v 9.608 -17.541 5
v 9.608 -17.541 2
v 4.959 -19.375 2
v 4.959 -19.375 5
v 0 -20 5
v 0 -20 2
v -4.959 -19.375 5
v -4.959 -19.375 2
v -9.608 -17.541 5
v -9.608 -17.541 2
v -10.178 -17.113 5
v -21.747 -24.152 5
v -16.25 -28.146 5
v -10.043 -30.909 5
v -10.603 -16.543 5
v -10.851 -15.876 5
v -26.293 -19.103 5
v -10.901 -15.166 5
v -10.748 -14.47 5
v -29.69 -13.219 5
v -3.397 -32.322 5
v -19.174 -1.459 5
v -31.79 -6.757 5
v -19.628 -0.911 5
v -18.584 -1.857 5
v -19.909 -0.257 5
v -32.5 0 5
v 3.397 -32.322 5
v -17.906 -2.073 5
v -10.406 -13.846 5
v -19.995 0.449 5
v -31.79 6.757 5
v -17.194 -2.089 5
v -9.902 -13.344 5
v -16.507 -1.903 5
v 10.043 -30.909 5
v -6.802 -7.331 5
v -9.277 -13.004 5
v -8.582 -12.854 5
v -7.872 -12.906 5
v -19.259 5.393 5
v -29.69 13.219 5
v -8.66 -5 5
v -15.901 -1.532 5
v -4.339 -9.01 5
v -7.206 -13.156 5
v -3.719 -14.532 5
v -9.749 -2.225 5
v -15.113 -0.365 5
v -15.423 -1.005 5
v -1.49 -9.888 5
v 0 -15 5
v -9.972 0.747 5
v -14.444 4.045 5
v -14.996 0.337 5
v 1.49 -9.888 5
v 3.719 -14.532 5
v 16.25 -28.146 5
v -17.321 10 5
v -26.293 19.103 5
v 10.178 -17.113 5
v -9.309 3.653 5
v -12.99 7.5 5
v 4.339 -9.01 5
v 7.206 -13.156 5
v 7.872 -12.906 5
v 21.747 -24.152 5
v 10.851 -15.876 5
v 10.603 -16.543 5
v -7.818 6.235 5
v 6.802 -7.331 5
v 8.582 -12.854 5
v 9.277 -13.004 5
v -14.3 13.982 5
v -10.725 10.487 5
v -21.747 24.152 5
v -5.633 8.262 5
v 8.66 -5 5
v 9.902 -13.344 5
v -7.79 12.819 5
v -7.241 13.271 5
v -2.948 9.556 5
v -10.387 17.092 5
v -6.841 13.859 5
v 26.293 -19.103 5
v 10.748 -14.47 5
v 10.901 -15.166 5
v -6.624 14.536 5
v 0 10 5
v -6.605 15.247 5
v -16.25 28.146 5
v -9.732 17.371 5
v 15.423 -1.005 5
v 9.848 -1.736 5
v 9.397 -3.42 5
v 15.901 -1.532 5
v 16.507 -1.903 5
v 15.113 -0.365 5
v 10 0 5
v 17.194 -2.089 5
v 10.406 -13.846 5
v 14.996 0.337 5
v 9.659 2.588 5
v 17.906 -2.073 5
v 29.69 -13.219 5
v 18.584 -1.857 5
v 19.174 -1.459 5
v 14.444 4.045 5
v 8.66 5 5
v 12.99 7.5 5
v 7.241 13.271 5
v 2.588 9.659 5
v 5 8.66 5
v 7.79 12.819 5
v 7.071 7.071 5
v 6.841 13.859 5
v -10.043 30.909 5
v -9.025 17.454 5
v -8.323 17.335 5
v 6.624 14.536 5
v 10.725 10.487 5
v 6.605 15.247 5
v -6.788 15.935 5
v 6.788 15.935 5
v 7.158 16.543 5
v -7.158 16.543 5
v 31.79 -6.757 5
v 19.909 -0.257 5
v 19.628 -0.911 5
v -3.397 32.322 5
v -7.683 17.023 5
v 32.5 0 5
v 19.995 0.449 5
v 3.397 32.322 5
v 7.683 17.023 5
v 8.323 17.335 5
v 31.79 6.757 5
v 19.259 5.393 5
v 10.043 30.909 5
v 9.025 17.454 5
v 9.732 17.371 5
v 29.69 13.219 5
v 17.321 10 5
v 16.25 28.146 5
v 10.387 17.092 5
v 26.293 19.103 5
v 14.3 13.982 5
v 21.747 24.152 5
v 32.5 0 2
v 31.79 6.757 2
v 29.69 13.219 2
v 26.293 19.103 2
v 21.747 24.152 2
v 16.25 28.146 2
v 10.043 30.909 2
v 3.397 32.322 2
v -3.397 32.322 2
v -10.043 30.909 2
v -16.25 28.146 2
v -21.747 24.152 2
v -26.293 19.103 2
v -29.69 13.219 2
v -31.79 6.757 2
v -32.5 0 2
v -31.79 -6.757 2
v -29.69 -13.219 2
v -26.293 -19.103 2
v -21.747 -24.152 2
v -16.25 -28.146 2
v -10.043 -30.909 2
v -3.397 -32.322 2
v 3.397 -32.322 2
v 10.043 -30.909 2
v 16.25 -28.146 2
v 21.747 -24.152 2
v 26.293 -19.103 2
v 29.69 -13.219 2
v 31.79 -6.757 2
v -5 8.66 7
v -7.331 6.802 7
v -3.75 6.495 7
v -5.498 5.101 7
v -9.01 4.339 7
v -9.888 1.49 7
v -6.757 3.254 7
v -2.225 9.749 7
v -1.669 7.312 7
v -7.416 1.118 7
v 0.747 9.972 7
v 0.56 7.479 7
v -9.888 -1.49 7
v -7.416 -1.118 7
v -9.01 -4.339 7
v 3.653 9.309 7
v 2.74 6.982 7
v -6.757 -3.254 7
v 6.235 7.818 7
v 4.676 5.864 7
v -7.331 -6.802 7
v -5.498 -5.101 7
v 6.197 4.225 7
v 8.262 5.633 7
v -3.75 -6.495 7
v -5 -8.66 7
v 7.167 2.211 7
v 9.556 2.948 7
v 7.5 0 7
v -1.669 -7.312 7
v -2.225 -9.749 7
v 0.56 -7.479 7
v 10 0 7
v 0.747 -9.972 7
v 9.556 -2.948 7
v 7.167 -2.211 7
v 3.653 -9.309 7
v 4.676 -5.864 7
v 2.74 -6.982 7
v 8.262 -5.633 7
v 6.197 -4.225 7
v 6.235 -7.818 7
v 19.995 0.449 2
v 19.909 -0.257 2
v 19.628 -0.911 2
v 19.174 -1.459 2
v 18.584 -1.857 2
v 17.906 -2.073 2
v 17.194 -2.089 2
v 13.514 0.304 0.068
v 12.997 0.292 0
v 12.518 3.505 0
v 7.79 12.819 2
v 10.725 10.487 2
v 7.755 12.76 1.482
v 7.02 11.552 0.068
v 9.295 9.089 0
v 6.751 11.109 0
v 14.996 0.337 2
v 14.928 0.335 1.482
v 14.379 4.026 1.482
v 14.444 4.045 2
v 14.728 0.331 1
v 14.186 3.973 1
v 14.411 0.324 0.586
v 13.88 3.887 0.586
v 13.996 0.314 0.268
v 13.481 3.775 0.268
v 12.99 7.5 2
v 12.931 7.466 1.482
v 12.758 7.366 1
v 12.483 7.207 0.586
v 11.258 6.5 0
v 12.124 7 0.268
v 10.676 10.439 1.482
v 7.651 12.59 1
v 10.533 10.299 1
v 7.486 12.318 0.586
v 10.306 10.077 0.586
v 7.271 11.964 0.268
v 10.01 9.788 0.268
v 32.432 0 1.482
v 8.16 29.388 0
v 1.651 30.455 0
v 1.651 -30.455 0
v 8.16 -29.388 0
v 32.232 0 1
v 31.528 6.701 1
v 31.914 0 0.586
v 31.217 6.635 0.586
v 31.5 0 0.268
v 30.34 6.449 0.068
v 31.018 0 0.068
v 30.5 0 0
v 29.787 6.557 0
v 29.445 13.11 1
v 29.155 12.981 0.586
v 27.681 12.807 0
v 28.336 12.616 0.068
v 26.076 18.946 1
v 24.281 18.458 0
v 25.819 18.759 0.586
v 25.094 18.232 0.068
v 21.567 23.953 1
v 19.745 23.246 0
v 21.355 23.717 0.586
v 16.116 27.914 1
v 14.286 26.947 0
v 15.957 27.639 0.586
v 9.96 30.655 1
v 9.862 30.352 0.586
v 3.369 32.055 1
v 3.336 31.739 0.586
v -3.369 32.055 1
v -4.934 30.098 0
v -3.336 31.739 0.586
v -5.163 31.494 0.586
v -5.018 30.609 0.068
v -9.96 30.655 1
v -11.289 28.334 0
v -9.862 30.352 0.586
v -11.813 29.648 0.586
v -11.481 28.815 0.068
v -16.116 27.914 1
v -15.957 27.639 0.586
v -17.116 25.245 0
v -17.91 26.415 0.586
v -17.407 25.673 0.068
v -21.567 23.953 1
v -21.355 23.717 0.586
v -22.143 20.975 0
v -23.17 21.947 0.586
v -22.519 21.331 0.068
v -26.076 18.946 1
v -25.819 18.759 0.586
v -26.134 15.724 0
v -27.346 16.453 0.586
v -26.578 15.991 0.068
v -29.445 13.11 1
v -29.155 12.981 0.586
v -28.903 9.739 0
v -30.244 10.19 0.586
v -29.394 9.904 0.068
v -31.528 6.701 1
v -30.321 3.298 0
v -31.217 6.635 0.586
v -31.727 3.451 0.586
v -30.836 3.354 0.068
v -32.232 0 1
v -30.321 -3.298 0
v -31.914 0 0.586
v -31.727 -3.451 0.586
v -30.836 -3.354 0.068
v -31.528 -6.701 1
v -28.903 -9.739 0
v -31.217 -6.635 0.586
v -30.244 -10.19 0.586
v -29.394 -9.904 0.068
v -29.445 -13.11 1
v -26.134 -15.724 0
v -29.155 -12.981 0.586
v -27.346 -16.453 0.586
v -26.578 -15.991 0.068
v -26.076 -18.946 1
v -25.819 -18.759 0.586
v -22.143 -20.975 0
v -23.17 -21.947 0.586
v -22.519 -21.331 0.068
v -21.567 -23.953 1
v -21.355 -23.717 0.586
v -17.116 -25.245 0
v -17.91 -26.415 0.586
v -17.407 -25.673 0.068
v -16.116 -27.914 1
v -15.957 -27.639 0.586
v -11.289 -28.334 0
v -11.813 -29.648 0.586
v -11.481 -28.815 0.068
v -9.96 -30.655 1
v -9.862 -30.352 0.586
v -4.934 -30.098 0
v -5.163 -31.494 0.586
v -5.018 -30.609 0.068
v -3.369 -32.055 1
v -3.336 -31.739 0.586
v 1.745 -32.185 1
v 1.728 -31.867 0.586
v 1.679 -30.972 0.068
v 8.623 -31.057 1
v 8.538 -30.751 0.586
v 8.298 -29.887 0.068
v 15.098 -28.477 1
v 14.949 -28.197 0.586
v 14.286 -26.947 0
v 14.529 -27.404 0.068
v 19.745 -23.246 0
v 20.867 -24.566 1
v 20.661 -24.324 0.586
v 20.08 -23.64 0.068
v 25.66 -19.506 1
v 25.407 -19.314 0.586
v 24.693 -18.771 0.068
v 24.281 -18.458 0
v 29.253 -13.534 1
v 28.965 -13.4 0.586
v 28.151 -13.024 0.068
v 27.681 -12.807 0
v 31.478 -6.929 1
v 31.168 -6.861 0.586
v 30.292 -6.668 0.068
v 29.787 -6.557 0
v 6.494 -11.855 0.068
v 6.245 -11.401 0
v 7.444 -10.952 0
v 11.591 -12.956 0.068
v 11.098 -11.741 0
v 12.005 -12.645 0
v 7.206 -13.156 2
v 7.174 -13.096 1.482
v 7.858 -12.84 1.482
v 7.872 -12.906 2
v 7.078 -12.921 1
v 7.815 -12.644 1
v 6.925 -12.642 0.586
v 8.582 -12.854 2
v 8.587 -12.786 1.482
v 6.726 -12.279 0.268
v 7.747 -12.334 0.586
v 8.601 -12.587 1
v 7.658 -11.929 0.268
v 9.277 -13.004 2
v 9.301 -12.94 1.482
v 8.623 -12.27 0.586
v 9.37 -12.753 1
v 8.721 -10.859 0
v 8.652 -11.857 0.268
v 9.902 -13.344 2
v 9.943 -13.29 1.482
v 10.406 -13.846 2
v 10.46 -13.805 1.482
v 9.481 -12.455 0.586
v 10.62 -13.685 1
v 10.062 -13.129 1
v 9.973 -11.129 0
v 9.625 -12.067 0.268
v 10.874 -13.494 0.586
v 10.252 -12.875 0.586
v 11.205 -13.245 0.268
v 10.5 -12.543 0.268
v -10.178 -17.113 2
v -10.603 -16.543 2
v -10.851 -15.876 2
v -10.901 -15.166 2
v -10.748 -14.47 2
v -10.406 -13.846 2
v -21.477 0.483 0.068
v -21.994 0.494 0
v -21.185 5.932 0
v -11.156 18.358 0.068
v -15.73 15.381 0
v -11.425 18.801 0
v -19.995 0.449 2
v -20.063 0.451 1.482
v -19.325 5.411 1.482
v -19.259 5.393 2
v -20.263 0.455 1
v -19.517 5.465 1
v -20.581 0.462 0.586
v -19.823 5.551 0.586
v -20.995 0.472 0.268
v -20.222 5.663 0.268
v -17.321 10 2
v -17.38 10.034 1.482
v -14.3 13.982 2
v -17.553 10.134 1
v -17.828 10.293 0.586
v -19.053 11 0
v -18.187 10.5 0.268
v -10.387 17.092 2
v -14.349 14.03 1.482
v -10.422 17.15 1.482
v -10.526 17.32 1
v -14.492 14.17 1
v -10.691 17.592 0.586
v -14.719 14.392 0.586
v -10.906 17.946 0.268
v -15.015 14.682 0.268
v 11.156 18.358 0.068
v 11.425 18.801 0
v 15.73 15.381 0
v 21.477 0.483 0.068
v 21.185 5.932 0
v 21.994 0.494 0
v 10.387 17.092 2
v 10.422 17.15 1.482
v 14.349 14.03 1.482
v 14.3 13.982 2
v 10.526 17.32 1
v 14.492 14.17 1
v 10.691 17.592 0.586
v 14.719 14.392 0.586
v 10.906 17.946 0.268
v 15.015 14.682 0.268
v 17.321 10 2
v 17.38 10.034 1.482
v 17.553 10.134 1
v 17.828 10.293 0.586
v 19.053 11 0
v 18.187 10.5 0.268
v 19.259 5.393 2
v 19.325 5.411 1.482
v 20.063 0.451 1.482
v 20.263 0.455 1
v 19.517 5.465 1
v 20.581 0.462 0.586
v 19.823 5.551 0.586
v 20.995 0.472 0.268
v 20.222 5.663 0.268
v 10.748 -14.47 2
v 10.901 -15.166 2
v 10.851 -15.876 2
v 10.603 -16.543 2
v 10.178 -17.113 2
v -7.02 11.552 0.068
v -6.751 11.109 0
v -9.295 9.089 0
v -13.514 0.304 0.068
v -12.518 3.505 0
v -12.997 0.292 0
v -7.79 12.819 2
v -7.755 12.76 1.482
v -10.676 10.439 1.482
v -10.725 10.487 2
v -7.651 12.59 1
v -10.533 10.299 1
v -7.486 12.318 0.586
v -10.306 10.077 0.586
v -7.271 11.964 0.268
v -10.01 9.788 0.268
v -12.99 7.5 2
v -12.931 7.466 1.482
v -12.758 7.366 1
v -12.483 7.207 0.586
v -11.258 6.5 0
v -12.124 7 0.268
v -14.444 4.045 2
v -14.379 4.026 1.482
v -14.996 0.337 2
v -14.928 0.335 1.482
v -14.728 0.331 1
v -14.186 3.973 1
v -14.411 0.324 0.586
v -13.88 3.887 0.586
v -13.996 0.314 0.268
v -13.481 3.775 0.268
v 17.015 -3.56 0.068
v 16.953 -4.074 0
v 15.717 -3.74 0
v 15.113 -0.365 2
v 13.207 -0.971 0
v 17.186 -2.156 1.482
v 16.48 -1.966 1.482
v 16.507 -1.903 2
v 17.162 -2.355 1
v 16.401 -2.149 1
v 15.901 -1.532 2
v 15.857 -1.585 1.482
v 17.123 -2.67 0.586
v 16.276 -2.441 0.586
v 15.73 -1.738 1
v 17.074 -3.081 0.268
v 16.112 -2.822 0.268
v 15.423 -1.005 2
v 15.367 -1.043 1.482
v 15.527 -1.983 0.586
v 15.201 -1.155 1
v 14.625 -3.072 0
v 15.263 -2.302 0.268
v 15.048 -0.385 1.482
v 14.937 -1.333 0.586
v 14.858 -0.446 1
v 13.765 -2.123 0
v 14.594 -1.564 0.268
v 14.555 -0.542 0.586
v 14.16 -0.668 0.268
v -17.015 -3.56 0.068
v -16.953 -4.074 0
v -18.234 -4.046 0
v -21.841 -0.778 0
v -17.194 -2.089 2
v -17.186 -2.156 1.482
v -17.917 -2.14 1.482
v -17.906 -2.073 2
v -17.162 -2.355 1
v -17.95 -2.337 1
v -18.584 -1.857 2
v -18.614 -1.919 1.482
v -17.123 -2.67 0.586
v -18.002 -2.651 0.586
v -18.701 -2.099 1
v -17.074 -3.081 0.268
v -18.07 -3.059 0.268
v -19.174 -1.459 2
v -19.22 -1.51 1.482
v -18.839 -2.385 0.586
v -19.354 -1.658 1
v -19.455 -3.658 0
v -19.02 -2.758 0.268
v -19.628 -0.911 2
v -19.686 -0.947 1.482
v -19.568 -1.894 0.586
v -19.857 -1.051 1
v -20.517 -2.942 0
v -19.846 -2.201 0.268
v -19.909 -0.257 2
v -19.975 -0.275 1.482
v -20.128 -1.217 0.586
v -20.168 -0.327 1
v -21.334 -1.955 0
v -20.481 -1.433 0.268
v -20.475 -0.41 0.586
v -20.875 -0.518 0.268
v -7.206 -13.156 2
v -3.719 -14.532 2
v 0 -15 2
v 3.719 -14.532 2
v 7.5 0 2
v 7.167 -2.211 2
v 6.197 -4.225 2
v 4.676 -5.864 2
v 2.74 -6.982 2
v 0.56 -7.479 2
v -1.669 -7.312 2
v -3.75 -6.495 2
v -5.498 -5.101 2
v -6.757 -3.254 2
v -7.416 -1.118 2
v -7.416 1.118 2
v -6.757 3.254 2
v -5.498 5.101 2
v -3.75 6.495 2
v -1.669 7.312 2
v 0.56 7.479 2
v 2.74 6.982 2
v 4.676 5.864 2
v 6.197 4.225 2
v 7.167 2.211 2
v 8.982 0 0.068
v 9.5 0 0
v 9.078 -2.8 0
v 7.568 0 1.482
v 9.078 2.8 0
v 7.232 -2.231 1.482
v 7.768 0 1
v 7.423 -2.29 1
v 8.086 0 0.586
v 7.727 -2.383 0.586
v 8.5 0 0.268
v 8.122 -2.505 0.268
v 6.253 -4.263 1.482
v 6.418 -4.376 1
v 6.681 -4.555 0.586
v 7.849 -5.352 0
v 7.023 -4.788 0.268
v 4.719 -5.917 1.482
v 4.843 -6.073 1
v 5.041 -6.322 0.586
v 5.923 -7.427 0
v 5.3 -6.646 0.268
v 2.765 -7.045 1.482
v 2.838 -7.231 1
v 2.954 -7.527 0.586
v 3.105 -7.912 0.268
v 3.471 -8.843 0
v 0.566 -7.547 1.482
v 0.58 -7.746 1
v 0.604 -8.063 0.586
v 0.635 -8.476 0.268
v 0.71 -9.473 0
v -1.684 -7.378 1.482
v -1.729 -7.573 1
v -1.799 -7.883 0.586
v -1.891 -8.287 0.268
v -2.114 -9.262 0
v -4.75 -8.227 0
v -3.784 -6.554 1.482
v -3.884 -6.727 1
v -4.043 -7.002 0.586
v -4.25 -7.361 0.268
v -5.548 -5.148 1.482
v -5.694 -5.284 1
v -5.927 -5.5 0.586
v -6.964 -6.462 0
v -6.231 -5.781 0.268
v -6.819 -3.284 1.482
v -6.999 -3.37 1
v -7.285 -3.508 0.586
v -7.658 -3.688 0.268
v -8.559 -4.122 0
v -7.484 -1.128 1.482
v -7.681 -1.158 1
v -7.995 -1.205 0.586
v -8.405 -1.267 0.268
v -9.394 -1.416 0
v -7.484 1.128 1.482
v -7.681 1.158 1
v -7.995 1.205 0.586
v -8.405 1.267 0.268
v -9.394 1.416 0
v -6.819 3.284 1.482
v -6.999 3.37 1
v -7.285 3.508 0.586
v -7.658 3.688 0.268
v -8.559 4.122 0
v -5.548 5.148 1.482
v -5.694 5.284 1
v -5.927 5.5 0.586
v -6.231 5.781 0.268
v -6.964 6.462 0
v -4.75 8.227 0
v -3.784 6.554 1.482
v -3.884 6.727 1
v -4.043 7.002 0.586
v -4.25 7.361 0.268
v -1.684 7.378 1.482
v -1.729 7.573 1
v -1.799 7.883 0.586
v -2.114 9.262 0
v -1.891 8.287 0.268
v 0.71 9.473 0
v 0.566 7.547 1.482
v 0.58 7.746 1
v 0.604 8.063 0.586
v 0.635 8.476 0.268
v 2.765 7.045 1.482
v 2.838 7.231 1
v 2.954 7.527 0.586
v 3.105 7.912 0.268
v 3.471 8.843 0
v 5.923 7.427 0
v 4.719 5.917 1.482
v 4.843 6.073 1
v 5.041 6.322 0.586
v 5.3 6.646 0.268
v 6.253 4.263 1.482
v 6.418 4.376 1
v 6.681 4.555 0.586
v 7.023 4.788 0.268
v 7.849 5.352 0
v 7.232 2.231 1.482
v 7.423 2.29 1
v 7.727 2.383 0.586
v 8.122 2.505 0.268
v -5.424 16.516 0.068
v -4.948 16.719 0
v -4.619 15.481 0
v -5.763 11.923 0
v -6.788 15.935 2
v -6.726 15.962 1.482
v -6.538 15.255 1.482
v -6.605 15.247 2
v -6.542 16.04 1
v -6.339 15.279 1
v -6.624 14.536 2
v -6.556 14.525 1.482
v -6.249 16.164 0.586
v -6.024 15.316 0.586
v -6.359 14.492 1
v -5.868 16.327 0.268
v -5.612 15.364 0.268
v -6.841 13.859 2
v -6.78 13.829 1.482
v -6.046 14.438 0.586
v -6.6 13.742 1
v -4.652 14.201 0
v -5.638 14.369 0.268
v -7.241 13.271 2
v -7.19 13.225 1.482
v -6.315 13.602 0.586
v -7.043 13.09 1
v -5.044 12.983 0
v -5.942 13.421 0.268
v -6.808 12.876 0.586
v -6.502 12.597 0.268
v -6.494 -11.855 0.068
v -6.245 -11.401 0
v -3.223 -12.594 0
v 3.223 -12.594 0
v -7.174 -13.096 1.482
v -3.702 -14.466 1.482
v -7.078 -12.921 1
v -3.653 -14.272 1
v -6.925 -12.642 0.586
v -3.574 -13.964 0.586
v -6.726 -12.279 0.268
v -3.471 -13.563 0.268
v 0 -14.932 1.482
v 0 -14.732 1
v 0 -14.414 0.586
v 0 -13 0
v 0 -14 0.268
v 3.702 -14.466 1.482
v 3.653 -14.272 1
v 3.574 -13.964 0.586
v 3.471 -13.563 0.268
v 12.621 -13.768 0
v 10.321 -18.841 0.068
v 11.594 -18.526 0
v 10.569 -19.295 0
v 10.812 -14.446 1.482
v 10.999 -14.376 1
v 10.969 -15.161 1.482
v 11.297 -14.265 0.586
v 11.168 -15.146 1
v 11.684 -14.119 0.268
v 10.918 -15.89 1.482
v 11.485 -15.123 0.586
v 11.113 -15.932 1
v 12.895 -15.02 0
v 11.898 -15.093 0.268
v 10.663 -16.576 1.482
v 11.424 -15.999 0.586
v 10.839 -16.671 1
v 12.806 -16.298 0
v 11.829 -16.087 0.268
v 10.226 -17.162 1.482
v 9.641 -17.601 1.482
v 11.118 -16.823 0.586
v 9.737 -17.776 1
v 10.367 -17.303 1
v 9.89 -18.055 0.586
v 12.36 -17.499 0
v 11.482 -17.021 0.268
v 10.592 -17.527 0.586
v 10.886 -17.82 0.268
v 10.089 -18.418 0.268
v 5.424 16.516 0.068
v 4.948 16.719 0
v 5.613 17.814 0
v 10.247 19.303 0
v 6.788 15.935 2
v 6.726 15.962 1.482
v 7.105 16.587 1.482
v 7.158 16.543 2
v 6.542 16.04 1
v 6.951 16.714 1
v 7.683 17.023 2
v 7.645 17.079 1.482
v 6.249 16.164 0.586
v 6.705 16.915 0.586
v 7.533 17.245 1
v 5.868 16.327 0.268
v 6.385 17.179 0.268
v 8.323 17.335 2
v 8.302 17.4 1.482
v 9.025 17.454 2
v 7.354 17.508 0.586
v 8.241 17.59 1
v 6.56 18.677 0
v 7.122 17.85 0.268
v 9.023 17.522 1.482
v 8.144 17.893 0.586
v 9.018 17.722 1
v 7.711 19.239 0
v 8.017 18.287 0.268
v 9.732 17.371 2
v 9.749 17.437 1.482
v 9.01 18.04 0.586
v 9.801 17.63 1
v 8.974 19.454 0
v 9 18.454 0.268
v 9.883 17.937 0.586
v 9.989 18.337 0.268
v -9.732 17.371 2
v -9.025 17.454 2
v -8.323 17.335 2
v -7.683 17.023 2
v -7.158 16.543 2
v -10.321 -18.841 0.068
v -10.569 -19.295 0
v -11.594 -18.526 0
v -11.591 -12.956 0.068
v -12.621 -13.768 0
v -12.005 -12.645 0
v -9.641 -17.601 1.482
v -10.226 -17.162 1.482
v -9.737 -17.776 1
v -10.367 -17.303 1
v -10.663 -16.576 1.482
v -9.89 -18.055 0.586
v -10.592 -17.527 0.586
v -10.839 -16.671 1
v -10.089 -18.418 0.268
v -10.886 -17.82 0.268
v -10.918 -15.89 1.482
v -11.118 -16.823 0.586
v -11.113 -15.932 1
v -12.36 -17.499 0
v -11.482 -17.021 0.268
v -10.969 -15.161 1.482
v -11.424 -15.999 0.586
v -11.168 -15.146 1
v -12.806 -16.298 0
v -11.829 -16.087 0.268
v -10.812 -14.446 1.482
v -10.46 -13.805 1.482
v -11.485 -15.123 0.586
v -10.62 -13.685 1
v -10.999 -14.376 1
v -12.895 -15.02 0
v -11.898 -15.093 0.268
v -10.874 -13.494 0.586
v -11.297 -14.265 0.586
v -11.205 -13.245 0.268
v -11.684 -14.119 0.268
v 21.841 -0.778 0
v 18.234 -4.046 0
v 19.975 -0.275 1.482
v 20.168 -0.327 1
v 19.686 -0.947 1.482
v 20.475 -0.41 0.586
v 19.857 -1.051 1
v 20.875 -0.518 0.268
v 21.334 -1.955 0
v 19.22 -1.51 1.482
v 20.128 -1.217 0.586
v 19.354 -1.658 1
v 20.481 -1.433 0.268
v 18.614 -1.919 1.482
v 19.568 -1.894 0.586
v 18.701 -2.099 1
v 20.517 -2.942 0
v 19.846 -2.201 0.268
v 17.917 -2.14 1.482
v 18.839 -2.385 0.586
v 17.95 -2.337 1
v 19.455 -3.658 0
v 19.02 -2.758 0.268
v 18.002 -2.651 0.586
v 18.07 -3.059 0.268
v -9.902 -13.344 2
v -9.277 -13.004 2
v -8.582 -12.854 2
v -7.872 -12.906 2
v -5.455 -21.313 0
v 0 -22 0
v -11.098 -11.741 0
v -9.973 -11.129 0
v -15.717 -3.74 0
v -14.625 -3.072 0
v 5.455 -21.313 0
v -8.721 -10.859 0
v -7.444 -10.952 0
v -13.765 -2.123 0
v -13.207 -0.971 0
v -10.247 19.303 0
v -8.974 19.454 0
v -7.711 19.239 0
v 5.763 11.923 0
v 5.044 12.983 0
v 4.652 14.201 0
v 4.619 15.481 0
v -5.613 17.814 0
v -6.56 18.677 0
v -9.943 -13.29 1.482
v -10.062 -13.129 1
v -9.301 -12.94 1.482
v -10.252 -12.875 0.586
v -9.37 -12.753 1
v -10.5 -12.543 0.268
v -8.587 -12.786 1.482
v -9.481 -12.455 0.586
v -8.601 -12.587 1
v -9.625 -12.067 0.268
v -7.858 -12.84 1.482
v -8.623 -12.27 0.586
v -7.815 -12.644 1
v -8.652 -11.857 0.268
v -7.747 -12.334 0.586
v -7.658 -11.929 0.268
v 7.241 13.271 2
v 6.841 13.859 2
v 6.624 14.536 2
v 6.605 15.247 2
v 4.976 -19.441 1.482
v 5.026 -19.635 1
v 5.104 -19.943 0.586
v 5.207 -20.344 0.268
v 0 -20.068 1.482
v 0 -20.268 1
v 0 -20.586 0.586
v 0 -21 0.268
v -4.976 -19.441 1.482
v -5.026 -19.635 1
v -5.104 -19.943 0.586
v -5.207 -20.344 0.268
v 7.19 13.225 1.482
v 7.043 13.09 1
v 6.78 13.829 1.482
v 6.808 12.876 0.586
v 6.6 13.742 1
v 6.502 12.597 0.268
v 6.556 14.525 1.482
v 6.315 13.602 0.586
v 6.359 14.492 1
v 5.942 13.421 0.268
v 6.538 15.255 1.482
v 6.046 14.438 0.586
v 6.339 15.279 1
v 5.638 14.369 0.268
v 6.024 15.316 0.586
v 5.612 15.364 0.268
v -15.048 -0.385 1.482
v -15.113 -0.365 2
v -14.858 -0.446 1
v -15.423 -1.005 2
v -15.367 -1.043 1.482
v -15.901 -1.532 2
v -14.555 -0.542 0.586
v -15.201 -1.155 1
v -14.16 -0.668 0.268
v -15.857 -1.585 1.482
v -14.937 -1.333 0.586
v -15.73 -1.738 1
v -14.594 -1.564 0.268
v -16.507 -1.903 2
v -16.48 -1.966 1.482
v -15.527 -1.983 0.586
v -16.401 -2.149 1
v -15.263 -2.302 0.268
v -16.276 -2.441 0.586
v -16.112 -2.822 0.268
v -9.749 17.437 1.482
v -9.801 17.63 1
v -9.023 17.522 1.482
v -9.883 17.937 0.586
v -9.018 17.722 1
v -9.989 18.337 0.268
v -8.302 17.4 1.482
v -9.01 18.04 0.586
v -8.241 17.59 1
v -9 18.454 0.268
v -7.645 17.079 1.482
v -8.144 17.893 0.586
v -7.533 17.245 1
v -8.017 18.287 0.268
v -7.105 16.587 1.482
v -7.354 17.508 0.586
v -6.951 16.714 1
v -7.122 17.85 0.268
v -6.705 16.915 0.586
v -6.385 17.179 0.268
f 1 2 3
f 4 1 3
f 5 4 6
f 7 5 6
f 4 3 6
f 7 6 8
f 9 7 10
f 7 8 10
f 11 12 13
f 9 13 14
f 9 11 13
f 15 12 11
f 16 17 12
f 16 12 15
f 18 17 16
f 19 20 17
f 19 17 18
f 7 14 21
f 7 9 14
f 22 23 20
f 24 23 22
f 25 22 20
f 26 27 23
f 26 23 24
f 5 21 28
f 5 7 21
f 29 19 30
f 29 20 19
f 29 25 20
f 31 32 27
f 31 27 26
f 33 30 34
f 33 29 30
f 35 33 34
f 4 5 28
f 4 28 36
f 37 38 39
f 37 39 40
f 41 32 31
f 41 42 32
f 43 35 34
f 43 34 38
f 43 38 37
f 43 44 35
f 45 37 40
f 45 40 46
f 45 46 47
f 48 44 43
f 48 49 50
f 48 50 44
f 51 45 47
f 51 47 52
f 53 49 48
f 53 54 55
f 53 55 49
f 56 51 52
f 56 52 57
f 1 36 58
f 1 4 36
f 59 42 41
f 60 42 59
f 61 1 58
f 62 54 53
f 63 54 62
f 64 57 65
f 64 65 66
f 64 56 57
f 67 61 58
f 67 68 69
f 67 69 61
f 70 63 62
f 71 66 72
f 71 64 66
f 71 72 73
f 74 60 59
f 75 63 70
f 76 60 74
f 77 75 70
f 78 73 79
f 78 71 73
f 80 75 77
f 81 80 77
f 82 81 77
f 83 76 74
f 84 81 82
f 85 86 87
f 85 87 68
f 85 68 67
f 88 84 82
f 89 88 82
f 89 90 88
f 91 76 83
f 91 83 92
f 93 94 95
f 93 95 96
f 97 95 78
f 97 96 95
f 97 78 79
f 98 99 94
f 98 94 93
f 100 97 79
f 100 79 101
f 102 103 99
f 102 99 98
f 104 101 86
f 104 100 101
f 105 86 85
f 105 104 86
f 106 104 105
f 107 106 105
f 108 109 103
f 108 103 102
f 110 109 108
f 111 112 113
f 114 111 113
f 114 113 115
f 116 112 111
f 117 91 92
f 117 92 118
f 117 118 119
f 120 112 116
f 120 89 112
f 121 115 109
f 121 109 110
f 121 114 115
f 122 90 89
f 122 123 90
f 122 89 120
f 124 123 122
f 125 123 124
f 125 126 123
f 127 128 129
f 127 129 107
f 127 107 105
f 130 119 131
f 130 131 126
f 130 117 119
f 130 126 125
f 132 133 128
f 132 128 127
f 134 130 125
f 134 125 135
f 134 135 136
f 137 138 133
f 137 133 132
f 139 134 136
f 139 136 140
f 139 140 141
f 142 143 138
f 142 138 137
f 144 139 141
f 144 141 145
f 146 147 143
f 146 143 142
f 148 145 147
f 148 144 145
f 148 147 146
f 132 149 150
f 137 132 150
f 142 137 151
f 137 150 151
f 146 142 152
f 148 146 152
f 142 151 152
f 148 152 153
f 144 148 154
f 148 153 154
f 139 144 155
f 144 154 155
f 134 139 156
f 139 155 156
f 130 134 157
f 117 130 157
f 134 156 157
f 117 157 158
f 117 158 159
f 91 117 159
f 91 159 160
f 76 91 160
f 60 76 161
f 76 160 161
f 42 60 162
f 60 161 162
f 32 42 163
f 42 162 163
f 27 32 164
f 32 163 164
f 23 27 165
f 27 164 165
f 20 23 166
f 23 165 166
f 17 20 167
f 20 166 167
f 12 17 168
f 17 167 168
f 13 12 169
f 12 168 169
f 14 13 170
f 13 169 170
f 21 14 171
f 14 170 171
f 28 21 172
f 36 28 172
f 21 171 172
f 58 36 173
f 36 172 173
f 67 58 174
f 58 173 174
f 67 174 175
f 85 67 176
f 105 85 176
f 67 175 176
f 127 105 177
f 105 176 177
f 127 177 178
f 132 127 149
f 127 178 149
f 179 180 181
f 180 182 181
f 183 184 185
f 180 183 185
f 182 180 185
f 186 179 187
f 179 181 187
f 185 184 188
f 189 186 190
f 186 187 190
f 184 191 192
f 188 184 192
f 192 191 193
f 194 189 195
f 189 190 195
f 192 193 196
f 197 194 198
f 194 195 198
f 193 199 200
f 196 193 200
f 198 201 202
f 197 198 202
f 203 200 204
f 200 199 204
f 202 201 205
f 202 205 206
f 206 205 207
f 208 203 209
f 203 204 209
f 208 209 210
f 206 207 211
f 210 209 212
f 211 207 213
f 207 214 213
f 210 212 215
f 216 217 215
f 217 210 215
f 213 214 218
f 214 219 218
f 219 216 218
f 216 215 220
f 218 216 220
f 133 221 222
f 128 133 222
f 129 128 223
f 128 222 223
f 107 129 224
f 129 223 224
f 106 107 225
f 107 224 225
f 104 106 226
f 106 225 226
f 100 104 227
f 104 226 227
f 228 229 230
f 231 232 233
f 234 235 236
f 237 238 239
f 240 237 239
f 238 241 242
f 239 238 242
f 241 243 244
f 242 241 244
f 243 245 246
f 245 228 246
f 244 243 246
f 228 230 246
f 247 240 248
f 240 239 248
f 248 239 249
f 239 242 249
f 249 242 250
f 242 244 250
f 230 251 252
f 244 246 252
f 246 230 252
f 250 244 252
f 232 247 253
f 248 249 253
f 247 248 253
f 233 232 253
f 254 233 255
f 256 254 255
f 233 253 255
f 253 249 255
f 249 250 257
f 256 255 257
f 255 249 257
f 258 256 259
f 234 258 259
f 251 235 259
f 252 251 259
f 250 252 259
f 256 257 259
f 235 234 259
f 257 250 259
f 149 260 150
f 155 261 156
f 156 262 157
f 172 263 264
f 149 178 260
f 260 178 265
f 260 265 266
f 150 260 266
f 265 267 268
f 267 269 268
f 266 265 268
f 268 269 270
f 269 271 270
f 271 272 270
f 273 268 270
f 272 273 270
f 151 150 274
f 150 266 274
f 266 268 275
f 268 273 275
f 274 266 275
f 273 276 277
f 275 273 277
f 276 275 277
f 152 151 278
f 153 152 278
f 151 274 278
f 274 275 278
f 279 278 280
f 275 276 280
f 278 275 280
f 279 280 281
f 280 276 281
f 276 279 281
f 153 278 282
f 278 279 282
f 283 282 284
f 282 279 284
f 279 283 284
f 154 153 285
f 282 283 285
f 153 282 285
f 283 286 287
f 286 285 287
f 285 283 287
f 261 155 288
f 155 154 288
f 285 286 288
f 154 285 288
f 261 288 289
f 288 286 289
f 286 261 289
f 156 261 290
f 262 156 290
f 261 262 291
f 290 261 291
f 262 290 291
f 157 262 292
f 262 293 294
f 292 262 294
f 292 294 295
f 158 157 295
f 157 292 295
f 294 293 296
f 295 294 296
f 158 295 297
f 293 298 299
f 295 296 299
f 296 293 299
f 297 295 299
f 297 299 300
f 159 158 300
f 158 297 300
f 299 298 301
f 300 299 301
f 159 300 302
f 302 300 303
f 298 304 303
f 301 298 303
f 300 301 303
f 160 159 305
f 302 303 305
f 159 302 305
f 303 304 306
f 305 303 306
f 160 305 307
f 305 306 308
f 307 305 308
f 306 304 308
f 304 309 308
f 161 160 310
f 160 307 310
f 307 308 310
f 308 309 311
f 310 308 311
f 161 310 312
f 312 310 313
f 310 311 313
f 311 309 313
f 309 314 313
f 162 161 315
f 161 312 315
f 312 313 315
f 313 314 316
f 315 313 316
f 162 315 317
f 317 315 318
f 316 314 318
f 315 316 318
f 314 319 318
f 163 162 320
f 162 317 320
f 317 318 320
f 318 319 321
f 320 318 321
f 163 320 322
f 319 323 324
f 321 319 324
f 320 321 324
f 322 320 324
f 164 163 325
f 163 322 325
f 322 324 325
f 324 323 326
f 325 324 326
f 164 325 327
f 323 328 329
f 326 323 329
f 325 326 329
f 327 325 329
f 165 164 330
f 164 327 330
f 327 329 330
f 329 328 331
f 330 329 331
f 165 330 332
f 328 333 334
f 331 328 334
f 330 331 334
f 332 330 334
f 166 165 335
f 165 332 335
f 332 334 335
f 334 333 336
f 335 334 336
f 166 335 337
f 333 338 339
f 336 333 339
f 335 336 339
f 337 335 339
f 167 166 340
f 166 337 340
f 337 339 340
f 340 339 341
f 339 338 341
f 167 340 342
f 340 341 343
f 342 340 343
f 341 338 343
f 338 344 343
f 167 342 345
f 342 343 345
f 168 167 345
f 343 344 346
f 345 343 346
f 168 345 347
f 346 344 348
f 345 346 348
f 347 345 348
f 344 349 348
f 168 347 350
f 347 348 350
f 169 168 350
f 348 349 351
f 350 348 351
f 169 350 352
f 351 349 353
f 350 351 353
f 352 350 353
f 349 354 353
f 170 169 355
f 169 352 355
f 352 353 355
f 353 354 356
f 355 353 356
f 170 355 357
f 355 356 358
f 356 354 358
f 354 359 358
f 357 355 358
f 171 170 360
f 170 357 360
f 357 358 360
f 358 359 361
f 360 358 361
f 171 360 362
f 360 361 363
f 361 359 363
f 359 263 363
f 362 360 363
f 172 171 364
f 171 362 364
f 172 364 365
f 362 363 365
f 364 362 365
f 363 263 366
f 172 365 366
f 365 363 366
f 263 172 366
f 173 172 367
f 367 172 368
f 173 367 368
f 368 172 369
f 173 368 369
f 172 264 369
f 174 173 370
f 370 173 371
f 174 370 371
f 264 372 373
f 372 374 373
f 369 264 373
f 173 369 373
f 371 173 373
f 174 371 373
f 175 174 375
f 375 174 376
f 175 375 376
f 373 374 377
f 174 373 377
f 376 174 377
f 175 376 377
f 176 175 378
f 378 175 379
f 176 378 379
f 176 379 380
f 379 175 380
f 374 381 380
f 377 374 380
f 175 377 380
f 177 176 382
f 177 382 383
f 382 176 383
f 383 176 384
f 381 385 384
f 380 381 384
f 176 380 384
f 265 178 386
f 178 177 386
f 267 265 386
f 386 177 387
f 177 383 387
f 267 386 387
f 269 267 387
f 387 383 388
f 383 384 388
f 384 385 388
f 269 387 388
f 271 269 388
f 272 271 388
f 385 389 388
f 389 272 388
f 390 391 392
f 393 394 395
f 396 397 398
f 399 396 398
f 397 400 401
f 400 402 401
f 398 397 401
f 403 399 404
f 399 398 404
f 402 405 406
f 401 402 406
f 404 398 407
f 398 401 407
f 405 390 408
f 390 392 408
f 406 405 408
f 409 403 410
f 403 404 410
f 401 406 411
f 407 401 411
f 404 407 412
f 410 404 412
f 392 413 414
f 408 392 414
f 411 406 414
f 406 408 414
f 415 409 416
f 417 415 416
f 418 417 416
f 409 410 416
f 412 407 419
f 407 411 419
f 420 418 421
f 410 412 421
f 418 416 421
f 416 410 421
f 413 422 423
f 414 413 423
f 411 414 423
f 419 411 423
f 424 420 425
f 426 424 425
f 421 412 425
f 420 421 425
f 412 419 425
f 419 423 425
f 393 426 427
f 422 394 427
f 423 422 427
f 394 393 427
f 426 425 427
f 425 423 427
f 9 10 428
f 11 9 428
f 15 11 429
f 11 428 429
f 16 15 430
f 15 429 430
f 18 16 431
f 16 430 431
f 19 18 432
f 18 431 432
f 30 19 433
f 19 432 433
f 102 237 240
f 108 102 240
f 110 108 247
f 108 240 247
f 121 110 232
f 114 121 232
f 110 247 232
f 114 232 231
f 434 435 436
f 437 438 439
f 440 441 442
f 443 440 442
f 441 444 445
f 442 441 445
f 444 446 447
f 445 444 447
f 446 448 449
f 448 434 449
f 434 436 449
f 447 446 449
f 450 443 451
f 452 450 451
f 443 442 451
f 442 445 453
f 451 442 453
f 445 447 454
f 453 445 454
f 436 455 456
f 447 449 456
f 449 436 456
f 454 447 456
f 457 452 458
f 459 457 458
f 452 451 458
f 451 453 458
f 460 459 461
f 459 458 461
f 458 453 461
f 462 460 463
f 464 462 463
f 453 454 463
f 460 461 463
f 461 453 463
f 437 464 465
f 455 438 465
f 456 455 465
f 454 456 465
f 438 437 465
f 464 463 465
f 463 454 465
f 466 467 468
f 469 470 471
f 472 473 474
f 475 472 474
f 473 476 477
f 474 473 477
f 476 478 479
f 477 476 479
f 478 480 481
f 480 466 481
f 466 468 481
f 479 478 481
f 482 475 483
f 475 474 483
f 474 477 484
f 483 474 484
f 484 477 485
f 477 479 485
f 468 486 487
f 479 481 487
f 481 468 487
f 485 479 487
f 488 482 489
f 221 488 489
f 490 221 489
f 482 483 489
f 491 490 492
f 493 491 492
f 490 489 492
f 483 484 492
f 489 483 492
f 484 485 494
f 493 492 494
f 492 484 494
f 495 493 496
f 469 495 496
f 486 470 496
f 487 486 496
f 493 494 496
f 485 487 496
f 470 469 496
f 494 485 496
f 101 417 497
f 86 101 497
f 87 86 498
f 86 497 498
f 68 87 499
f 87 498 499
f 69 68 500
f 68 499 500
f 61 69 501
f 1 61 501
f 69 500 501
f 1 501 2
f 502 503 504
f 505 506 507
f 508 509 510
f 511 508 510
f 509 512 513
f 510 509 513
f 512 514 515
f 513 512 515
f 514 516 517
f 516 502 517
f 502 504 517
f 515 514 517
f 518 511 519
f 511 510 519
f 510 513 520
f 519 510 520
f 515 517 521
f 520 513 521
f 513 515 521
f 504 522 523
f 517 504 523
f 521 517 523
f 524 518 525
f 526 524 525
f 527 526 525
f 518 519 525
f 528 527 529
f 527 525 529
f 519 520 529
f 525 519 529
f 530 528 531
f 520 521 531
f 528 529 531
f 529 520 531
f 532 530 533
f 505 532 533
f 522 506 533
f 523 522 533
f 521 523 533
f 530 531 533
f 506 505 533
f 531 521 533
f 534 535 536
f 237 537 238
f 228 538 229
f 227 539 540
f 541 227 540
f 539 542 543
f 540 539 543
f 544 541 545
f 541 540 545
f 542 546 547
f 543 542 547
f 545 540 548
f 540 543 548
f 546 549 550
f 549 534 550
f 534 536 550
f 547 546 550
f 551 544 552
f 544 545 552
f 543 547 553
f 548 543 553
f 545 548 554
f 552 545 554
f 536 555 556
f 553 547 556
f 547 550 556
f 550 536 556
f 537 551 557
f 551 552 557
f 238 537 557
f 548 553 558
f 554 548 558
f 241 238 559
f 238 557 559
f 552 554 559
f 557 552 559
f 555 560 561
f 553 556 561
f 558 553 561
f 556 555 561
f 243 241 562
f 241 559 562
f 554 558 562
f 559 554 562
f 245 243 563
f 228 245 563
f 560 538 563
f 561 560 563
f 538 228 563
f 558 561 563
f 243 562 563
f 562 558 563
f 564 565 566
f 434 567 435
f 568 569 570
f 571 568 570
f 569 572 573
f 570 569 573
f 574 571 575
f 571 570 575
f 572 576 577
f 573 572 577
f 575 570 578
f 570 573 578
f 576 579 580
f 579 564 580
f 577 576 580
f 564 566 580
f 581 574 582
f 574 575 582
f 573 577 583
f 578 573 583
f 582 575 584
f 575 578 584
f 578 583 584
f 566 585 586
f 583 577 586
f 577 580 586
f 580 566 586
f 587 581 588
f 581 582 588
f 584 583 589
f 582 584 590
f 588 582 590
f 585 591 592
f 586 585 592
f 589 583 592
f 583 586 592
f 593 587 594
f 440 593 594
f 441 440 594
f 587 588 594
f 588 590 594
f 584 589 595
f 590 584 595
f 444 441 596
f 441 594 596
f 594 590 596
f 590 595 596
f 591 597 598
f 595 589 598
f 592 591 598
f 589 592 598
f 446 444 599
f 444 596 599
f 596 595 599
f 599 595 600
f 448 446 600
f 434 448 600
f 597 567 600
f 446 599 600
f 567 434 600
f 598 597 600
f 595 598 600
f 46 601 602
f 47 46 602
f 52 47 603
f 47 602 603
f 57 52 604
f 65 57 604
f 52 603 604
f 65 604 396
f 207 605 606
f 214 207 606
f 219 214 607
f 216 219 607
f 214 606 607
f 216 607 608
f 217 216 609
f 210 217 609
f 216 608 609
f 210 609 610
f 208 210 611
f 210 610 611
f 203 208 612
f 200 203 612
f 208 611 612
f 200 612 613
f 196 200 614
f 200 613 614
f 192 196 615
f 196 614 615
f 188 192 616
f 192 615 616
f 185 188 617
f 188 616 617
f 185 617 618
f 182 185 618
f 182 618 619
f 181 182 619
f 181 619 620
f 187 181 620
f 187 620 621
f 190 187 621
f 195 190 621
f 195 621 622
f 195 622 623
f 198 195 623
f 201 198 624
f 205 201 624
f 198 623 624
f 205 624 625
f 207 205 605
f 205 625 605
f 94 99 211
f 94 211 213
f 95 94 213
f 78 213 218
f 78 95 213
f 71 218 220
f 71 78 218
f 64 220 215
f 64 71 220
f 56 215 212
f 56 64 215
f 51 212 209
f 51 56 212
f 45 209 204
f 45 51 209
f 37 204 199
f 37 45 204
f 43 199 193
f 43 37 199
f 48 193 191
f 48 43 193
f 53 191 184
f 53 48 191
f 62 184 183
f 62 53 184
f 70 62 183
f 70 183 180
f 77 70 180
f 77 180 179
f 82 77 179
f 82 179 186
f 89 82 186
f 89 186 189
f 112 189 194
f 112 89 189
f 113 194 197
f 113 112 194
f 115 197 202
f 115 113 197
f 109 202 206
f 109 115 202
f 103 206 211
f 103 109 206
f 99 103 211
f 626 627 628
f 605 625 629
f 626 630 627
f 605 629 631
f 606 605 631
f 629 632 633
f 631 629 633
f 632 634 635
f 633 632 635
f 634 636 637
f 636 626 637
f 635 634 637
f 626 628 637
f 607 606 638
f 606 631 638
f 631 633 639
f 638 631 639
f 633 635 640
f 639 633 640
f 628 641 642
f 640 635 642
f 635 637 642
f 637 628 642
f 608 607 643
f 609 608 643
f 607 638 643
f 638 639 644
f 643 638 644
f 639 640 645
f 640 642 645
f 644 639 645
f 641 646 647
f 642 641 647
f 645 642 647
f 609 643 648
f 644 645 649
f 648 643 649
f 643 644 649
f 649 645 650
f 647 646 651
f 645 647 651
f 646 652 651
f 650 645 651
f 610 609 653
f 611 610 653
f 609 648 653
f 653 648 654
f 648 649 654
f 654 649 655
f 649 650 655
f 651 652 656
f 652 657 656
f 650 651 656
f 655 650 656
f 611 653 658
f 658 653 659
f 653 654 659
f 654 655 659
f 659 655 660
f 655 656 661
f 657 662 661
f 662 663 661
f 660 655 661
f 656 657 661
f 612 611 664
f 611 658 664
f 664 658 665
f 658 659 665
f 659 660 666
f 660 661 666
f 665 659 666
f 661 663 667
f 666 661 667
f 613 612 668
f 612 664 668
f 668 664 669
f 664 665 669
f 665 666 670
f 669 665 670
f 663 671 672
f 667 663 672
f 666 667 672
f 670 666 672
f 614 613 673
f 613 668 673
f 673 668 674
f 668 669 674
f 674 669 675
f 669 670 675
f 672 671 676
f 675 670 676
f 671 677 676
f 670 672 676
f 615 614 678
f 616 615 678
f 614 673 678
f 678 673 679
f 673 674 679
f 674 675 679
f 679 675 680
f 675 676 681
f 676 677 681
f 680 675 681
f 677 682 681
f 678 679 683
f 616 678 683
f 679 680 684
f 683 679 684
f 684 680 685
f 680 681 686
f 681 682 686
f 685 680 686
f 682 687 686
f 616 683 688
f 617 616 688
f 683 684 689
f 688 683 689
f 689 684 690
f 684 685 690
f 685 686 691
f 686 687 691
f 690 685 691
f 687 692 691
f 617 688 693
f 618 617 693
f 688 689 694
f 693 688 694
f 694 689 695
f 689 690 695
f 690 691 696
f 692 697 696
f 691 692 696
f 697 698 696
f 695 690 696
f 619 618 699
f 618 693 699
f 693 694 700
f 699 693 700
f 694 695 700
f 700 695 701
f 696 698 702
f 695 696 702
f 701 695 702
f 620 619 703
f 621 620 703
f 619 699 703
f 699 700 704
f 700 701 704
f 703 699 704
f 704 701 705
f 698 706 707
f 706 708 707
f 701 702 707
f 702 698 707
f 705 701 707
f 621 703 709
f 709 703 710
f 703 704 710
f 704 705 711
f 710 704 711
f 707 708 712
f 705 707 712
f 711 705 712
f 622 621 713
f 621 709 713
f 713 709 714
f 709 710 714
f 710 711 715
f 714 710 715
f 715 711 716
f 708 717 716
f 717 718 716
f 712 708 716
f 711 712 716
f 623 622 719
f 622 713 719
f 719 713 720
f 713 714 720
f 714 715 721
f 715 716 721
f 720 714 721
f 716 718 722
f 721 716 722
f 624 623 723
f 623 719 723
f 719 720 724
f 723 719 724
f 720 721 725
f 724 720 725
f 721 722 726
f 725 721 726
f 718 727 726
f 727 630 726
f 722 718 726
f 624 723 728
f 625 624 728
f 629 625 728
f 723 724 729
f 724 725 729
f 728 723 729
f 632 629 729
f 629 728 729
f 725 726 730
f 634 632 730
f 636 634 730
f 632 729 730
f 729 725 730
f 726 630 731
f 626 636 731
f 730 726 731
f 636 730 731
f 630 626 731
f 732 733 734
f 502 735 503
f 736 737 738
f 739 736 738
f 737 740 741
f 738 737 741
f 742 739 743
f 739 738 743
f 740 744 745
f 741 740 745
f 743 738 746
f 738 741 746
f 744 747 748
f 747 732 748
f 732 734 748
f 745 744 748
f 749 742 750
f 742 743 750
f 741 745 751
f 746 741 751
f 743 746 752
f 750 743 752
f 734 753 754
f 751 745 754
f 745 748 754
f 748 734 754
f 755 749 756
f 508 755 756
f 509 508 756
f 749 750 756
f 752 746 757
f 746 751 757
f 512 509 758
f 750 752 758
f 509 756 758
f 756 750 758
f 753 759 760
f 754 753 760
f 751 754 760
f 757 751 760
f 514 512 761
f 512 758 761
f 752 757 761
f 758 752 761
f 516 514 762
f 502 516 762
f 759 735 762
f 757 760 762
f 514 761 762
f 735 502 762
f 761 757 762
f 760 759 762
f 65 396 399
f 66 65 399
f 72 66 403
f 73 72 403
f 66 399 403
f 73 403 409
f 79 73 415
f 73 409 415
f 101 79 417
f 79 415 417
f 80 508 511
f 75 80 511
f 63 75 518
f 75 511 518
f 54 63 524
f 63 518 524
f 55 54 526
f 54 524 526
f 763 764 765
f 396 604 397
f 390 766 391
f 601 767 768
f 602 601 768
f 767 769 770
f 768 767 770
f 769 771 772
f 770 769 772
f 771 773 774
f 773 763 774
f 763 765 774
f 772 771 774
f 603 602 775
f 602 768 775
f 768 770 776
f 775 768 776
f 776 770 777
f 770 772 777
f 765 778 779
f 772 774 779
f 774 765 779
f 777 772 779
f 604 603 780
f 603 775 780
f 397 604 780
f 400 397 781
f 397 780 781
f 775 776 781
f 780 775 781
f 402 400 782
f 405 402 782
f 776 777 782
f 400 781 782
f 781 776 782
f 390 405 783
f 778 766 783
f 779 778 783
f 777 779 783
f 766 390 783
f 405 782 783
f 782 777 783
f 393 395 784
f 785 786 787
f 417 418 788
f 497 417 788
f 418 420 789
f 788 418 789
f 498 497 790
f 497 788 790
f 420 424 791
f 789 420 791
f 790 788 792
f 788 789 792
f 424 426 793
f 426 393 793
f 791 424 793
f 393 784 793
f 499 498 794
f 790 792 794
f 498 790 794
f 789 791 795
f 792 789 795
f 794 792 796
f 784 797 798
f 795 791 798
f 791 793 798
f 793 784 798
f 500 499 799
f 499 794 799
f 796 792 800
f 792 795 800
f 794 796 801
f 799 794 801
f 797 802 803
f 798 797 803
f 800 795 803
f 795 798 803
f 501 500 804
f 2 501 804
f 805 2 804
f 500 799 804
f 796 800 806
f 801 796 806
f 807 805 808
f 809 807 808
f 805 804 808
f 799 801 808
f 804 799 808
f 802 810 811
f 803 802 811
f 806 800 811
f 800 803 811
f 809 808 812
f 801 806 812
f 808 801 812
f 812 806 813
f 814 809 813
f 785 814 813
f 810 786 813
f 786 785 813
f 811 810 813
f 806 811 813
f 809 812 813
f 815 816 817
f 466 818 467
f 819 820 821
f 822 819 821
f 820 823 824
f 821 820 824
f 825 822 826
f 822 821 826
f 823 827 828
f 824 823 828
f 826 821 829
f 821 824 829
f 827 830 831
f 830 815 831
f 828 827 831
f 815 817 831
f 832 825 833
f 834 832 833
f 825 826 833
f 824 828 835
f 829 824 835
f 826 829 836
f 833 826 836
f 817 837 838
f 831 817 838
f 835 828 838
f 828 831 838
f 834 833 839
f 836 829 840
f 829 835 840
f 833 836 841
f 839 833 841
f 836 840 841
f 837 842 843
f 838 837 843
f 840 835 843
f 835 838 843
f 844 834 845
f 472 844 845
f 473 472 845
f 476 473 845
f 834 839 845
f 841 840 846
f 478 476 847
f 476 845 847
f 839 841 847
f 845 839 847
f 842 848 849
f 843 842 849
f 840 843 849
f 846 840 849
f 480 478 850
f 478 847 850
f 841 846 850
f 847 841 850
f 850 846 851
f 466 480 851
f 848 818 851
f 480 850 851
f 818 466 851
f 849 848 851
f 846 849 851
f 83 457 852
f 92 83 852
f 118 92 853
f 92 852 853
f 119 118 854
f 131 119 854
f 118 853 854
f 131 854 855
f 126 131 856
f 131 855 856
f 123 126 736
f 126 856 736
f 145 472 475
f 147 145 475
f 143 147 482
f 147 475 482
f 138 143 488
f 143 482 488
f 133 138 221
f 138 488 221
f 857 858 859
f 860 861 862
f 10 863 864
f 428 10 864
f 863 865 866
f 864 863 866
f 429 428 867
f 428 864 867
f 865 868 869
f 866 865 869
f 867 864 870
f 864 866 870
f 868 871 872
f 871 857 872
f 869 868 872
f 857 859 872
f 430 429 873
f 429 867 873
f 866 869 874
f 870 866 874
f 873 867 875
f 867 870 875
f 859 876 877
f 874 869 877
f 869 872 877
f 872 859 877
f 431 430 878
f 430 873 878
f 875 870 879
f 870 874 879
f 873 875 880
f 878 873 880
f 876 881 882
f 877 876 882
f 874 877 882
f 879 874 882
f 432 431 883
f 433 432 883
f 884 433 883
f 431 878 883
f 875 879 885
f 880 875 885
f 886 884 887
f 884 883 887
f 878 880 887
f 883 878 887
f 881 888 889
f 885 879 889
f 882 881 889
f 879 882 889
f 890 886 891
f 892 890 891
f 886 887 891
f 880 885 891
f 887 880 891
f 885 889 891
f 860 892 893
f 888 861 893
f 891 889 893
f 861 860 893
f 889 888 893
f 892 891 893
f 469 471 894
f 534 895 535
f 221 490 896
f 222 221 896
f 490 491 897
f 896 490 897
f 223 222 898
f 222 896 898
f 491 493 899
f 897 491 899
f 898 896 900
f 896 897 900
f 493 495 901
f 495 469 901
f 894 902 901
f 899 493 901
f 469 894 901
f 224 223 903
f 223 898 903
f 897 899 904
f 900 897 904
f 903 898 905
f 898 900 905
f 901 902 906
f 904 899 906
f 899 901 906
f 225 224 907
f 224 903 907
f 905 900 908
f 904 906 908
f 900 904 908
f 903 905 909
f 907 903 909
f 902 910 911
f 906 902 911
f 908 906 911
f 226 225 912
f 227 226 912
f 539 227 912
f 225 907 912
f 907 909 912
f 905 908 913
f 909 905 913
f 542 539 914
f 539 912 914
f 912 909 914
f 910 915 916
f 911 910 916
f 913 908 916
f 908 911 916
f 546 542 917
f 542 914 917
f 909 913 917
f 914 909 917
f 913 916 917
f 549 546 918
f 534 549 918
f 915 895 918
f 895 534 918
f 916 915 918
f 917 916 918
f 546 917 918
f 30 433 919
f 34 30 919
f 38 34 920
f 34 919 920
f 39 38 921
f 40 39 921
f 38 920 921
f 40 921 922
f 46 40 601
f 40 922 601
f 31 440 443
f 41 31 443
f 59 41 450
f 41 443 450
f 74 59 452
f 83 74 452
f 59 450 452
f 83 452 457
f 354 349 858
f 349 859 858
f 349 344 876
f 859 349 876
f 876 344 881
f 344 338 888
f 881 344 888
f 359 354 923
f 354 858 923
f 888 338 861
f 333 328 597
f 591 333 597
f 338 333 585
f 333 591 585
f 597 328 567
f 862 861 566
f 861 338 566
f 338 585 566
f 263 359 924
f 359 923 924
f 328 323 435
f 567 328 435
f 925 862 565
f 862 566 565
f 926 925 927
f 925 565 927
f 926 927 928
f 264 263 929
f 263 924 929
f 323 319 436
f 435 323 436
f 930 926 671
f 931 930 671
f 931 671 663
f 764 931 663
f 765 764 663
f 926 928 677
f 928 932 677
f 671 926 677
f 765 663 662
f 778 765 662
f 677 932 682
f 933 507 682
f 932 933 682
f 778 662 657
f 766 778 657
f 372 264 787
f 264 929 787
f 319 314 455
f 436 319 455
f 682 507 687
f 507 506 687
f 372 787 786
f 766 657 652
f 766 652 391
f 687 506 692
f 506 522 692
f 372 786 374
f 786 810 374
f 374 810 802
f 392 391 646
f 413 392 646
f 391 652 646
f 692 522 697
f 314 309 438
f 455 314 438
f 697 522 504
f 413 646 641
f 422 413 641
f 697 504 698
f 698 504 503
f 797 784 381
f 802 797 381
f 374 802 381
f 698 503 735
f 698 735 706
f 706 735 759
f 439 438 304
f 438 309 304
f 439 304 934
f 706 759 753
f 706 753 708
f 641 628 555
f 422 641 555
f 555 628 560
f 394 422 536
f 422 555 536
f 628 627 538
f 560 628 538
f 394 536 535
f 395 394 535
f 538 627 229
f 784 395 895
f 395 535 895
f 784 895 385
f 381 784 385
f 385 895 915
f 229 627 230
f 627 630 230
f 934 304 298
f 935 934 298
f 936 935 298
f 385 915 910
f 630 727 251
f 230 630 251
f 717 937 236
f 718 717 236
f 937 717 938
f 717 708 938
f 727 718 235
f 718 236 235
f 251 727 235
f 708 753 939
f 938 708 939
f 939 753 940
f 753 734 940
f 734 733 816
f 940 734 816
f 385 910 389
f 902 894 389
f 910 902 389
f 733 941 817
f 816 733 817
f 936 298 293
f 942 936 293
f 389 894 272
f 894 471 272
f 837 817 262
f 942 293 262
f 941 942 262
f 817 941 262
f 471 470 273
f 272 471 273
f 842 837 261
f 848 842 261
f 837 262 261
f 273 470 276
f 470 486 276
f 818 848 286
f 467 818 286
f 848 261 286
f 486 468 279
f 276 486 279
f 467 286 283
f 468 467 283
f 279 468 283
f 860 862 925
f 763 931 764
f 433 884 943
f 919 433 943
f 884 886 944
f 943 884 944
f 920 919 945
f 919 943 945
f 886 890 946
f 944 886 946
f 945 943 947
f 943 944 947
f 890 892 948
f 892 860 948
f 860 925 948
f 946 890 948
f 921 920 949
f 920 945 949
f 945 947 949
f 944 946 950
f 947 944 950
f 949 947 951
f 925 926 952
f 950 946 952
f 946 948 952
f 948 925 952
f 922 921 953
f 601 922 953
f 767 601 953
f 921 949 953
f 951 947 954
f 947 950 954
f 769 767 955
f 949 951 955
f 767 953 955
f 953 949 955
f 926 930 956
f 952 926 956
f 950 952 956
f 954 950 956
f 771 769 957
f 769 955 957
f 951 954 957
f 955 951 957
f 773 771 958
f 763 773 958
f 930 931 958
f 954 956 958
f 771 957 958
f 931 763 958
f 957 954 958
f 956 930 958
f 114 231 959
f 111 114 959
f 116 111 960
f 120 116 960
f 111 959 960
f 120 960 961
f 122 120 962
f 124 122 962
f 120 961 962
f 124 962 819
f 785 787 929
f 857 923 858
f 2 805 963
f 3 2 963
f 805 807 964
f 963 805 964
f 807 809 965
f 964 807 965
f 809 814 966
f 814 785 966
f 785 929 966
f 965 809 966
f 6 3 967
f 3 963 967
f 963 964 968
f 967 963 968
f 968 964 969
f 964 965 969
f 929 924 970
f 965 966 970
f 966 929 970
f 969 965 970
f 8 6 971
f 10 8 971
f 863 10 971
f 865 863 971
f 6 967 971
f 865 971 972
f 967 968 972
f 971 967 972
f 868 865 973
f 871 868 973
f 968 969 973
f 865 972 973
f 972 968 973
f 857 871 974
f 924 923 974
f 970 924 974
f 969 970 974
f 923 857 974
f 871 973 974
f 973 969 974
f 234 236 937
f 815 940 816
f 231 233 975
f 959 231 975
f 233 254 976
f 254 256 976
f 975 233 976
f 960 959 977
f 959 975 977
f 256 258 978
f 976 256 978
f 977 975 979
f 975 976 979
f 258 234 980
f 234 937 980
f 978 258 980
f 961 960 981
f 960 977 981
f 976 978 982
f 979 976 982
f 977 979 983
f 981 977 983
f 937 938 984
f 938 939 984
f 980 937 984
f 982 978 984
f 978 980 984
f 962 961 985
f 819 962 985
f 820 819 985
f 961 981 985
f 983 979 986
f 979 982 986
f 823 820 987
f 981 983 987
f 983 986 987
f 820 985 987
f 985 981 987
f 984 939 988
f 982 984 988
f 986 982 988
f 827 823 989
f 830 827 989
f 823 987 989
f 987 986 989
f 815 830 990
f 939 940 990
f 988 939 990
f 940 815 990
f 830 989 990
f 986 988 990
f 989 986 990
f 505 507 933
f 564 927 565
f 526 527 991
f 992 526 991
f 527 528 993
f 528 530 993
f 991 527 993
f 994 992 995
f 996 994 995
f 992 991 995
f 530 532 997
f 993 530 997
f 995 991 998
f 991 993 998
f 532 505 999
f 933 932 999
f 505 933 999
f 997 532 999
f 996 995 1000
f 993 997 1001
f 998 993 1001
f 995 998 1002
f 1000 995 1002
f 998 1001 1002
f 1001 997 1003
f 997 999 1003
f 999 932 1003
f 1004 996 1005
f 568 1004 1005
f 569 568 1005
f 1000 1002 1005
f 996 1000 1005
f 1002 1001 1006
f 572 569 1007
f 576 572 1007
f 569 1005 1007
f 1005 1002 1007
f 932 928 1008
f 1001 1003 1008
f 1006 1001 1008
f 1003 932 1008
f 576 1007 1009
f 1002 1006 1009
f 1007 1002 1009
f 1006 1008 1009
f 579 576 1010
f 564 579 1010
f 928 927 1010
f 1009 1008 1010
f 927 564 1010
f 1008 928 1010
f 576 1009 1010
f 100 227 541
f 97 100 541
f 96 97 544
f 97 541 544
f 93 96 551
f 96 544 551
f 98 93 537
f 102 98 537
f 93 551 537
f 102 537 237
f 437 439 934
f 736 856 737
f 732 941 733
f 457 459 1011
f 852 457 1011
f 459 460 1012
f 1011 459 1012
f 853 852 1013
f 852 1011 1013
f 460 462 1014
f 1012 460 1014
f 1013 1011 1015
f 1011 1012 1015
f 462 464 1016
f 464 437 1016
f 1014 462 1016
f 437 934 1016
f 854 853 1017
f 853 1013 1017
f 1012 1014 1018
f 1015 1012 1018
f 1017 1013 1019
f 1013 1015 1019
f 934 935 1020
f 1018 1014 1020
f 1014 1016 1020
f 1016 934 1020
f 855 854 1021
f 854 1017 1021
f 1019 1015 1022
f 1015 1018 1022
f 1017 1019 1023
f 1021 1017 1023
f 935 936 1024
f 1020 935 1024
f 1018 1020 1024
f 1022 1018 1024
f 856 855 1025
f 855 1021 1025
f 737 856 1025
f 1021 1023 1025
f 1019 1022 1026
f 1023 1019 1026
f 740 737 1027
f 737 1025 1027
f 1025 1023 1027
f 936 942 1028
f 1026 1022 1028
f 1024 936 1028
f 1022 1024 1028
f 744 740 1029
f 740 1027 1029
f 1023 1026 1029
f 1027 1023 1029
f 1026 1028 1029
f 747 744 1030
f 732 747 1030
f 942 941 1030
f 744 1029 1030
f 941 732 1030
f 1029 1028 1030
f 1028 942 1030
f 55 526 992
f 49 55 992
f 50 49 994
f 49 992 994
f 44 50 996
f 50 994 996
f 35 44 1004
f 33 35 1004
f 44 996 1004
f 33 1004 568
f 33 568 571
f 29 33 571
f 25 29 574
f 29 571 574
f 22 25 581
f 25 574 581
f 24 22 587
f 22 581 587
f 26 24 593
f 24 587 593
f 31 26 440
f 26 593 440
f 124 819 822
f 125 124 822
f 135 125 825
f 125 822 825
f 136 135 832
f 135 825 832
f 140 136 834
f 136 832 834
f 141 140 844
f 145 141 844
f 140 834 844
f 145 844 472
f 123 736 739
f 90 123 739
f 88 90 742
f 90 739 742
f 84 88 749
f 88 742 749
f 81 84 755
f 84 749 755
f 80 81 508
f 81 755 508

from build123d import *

# Parameters (mm, degrees)
F0_R     = 32.5
F1_DEPTH = 5
F2_R     = 10
F2_R_2   = 7.5
F3_DEPTH = 7
F4_R     = 2


with BuildPart() as f1:
    # F0 (on Top) → F1 (new body)
    with BuildSketch(Plane.XY):
        Circle(F0_R)
        with BuildLine():
            ThreePointArc((-9.6084106433, -17.5407652316), (-10.8510784968, -15.8756509046), (-10.4058874503, -13.8462090975))
            ThreePointArc((-10.4058874503, -13.8462090975), (-8.9348406398, -12.9044503937), (-7.2063079825, -13.1555739237))
            ThreePointArc((-7.2063079825, -13.1555739237), (0, -15), (7.2063079825, -13.1555739237))
            ThreePointArc((7.2063079825, -13.1555739237), (8.9348406398, -12.9044503937), (10.4058874503, -13.8462090975))
            ThreePointArc((10.4058874503, -13.8462090975), (10.8510784968, -15.8756509046), (9.6084106433, -17.5407652316))
            ThreePointArc((9.6084106433, -17.5407652316), (0, -20), (-9.6084106433, -17.5407652316))
        make_face(mode=Mode.SUBTRACT)
        with BuildLine():
            ThreePointArc((-19.994953614, 0.4492549087), (-17.3205080757, 10), (-10.3865429707, 17.0915103229))
            ThreePointArc((-10.3865429707, 17.0915103229), (-8.3231777366, 17.335135089), (-6.7882250994, 15.9348674296))
            ThreePointArc((-6.7882250994, 15.9348674296), (-6.708161543, 14.1900241697), (-7.789907228, 12.8186327422))
            ThreePointArc((-7.789907228, 12.8186327422), (-12.9903810568, 7.5), (-14.9962152105, 0.3369411815))
            ThreePointArc((-14.9962152105, 0.3369411815), (-15.6430021828, -1.285573776), (-17.1941125497, -2.0886583321))
            ThreePointArc((-17.1941125497, -2.0886583321), (-19.1742562334, -1.4594841844), (-19.994953614, 0.4492549087))
        make_face(mode=Mode.SUBTRACT)
        with BuildLine():
            ThreePointArc((0, 10), (7.0710678119, 7.0710678119), (10, 0))
            ThreePointArc((10, 0), (9.6592582629, -2.588190451), (8.6602540378, -5))
            ThreePointArc((8.6602540378, -5), (0, -10), (-8.6602540378, -5))
            ThreePointArc((-8.6602540378, -5), (-8.6602540378, 5), (0, 10))
        make_face(mode=Mode.SUBTRACT)
        with BuildLine():
            ThreePointArc((19.994953614, 0.4492549087), (19.1742562334, -1.4594841844), (17.1941125497, -2.0886583321))
            ThreePointArc((17.1941125497, -2.0886583321), (15.6430021828, -1.285573776), (14.9962152105, 0.3369411815))
            ThreePointArc((14.9962152105, 0.3369411815), (12.9903810568, 7.5), (7.789907228, 12.8186327422))
            ThreePointArc((7.789907228, 12.8186327422), (6.708161543, 14.1900241697), (6.7882250994, 15.9348674296))
            ThreePointArc((6.7882250994, 15.9348674296), (8.3231777366, 17.335135089), (10.3865429707, 17.0915103229))
            ThreePointArc((10.3865429707, 17.0915103229), (17.3205080757, 10), (19.994953614, 0.4492549087))
        make_face(mode=Mode.SUBTRACT)
    extrude(amount=F1_DEPTH)

    # F2 (on face) → F3 (join)
    with BuildSketch(Plane(origin=(0, 0, 0), x_dir=(1, 0, 0), z_dir=(0, 0, -1))):
        Circle(F2_R)
        Circle(F2_R_2, mode=Mode.SUBTRACT)
    extrude(amount=-F3_DEPTH)

    # F4
    f4_edges = [f1.edges().sort_by_distance(p)[0] for p in [
        (-32.5, 0, 0),
        (-10.599955, -14.147118, 0),
        (0, -15, 0),
        (10.599955, -14.147118, 0),
        (0, -20, 0),
        (-17.320508, 10, 0),
        (-6.951786, 16.253389, 0),
        (-12.990381, 7.5, 0),
        (-17.551741, -2.106271, 0),
        (17.551741, -2.106271, 0),
        (12.990381, 7.5, 0),
        (6.951786, 16.253389, 0),
        (17.320508, 10, 0),
        (-7.5, 0, 0),
    ]]
    fillet(f4_edges, radius=F4_R)


solid = f1.part
